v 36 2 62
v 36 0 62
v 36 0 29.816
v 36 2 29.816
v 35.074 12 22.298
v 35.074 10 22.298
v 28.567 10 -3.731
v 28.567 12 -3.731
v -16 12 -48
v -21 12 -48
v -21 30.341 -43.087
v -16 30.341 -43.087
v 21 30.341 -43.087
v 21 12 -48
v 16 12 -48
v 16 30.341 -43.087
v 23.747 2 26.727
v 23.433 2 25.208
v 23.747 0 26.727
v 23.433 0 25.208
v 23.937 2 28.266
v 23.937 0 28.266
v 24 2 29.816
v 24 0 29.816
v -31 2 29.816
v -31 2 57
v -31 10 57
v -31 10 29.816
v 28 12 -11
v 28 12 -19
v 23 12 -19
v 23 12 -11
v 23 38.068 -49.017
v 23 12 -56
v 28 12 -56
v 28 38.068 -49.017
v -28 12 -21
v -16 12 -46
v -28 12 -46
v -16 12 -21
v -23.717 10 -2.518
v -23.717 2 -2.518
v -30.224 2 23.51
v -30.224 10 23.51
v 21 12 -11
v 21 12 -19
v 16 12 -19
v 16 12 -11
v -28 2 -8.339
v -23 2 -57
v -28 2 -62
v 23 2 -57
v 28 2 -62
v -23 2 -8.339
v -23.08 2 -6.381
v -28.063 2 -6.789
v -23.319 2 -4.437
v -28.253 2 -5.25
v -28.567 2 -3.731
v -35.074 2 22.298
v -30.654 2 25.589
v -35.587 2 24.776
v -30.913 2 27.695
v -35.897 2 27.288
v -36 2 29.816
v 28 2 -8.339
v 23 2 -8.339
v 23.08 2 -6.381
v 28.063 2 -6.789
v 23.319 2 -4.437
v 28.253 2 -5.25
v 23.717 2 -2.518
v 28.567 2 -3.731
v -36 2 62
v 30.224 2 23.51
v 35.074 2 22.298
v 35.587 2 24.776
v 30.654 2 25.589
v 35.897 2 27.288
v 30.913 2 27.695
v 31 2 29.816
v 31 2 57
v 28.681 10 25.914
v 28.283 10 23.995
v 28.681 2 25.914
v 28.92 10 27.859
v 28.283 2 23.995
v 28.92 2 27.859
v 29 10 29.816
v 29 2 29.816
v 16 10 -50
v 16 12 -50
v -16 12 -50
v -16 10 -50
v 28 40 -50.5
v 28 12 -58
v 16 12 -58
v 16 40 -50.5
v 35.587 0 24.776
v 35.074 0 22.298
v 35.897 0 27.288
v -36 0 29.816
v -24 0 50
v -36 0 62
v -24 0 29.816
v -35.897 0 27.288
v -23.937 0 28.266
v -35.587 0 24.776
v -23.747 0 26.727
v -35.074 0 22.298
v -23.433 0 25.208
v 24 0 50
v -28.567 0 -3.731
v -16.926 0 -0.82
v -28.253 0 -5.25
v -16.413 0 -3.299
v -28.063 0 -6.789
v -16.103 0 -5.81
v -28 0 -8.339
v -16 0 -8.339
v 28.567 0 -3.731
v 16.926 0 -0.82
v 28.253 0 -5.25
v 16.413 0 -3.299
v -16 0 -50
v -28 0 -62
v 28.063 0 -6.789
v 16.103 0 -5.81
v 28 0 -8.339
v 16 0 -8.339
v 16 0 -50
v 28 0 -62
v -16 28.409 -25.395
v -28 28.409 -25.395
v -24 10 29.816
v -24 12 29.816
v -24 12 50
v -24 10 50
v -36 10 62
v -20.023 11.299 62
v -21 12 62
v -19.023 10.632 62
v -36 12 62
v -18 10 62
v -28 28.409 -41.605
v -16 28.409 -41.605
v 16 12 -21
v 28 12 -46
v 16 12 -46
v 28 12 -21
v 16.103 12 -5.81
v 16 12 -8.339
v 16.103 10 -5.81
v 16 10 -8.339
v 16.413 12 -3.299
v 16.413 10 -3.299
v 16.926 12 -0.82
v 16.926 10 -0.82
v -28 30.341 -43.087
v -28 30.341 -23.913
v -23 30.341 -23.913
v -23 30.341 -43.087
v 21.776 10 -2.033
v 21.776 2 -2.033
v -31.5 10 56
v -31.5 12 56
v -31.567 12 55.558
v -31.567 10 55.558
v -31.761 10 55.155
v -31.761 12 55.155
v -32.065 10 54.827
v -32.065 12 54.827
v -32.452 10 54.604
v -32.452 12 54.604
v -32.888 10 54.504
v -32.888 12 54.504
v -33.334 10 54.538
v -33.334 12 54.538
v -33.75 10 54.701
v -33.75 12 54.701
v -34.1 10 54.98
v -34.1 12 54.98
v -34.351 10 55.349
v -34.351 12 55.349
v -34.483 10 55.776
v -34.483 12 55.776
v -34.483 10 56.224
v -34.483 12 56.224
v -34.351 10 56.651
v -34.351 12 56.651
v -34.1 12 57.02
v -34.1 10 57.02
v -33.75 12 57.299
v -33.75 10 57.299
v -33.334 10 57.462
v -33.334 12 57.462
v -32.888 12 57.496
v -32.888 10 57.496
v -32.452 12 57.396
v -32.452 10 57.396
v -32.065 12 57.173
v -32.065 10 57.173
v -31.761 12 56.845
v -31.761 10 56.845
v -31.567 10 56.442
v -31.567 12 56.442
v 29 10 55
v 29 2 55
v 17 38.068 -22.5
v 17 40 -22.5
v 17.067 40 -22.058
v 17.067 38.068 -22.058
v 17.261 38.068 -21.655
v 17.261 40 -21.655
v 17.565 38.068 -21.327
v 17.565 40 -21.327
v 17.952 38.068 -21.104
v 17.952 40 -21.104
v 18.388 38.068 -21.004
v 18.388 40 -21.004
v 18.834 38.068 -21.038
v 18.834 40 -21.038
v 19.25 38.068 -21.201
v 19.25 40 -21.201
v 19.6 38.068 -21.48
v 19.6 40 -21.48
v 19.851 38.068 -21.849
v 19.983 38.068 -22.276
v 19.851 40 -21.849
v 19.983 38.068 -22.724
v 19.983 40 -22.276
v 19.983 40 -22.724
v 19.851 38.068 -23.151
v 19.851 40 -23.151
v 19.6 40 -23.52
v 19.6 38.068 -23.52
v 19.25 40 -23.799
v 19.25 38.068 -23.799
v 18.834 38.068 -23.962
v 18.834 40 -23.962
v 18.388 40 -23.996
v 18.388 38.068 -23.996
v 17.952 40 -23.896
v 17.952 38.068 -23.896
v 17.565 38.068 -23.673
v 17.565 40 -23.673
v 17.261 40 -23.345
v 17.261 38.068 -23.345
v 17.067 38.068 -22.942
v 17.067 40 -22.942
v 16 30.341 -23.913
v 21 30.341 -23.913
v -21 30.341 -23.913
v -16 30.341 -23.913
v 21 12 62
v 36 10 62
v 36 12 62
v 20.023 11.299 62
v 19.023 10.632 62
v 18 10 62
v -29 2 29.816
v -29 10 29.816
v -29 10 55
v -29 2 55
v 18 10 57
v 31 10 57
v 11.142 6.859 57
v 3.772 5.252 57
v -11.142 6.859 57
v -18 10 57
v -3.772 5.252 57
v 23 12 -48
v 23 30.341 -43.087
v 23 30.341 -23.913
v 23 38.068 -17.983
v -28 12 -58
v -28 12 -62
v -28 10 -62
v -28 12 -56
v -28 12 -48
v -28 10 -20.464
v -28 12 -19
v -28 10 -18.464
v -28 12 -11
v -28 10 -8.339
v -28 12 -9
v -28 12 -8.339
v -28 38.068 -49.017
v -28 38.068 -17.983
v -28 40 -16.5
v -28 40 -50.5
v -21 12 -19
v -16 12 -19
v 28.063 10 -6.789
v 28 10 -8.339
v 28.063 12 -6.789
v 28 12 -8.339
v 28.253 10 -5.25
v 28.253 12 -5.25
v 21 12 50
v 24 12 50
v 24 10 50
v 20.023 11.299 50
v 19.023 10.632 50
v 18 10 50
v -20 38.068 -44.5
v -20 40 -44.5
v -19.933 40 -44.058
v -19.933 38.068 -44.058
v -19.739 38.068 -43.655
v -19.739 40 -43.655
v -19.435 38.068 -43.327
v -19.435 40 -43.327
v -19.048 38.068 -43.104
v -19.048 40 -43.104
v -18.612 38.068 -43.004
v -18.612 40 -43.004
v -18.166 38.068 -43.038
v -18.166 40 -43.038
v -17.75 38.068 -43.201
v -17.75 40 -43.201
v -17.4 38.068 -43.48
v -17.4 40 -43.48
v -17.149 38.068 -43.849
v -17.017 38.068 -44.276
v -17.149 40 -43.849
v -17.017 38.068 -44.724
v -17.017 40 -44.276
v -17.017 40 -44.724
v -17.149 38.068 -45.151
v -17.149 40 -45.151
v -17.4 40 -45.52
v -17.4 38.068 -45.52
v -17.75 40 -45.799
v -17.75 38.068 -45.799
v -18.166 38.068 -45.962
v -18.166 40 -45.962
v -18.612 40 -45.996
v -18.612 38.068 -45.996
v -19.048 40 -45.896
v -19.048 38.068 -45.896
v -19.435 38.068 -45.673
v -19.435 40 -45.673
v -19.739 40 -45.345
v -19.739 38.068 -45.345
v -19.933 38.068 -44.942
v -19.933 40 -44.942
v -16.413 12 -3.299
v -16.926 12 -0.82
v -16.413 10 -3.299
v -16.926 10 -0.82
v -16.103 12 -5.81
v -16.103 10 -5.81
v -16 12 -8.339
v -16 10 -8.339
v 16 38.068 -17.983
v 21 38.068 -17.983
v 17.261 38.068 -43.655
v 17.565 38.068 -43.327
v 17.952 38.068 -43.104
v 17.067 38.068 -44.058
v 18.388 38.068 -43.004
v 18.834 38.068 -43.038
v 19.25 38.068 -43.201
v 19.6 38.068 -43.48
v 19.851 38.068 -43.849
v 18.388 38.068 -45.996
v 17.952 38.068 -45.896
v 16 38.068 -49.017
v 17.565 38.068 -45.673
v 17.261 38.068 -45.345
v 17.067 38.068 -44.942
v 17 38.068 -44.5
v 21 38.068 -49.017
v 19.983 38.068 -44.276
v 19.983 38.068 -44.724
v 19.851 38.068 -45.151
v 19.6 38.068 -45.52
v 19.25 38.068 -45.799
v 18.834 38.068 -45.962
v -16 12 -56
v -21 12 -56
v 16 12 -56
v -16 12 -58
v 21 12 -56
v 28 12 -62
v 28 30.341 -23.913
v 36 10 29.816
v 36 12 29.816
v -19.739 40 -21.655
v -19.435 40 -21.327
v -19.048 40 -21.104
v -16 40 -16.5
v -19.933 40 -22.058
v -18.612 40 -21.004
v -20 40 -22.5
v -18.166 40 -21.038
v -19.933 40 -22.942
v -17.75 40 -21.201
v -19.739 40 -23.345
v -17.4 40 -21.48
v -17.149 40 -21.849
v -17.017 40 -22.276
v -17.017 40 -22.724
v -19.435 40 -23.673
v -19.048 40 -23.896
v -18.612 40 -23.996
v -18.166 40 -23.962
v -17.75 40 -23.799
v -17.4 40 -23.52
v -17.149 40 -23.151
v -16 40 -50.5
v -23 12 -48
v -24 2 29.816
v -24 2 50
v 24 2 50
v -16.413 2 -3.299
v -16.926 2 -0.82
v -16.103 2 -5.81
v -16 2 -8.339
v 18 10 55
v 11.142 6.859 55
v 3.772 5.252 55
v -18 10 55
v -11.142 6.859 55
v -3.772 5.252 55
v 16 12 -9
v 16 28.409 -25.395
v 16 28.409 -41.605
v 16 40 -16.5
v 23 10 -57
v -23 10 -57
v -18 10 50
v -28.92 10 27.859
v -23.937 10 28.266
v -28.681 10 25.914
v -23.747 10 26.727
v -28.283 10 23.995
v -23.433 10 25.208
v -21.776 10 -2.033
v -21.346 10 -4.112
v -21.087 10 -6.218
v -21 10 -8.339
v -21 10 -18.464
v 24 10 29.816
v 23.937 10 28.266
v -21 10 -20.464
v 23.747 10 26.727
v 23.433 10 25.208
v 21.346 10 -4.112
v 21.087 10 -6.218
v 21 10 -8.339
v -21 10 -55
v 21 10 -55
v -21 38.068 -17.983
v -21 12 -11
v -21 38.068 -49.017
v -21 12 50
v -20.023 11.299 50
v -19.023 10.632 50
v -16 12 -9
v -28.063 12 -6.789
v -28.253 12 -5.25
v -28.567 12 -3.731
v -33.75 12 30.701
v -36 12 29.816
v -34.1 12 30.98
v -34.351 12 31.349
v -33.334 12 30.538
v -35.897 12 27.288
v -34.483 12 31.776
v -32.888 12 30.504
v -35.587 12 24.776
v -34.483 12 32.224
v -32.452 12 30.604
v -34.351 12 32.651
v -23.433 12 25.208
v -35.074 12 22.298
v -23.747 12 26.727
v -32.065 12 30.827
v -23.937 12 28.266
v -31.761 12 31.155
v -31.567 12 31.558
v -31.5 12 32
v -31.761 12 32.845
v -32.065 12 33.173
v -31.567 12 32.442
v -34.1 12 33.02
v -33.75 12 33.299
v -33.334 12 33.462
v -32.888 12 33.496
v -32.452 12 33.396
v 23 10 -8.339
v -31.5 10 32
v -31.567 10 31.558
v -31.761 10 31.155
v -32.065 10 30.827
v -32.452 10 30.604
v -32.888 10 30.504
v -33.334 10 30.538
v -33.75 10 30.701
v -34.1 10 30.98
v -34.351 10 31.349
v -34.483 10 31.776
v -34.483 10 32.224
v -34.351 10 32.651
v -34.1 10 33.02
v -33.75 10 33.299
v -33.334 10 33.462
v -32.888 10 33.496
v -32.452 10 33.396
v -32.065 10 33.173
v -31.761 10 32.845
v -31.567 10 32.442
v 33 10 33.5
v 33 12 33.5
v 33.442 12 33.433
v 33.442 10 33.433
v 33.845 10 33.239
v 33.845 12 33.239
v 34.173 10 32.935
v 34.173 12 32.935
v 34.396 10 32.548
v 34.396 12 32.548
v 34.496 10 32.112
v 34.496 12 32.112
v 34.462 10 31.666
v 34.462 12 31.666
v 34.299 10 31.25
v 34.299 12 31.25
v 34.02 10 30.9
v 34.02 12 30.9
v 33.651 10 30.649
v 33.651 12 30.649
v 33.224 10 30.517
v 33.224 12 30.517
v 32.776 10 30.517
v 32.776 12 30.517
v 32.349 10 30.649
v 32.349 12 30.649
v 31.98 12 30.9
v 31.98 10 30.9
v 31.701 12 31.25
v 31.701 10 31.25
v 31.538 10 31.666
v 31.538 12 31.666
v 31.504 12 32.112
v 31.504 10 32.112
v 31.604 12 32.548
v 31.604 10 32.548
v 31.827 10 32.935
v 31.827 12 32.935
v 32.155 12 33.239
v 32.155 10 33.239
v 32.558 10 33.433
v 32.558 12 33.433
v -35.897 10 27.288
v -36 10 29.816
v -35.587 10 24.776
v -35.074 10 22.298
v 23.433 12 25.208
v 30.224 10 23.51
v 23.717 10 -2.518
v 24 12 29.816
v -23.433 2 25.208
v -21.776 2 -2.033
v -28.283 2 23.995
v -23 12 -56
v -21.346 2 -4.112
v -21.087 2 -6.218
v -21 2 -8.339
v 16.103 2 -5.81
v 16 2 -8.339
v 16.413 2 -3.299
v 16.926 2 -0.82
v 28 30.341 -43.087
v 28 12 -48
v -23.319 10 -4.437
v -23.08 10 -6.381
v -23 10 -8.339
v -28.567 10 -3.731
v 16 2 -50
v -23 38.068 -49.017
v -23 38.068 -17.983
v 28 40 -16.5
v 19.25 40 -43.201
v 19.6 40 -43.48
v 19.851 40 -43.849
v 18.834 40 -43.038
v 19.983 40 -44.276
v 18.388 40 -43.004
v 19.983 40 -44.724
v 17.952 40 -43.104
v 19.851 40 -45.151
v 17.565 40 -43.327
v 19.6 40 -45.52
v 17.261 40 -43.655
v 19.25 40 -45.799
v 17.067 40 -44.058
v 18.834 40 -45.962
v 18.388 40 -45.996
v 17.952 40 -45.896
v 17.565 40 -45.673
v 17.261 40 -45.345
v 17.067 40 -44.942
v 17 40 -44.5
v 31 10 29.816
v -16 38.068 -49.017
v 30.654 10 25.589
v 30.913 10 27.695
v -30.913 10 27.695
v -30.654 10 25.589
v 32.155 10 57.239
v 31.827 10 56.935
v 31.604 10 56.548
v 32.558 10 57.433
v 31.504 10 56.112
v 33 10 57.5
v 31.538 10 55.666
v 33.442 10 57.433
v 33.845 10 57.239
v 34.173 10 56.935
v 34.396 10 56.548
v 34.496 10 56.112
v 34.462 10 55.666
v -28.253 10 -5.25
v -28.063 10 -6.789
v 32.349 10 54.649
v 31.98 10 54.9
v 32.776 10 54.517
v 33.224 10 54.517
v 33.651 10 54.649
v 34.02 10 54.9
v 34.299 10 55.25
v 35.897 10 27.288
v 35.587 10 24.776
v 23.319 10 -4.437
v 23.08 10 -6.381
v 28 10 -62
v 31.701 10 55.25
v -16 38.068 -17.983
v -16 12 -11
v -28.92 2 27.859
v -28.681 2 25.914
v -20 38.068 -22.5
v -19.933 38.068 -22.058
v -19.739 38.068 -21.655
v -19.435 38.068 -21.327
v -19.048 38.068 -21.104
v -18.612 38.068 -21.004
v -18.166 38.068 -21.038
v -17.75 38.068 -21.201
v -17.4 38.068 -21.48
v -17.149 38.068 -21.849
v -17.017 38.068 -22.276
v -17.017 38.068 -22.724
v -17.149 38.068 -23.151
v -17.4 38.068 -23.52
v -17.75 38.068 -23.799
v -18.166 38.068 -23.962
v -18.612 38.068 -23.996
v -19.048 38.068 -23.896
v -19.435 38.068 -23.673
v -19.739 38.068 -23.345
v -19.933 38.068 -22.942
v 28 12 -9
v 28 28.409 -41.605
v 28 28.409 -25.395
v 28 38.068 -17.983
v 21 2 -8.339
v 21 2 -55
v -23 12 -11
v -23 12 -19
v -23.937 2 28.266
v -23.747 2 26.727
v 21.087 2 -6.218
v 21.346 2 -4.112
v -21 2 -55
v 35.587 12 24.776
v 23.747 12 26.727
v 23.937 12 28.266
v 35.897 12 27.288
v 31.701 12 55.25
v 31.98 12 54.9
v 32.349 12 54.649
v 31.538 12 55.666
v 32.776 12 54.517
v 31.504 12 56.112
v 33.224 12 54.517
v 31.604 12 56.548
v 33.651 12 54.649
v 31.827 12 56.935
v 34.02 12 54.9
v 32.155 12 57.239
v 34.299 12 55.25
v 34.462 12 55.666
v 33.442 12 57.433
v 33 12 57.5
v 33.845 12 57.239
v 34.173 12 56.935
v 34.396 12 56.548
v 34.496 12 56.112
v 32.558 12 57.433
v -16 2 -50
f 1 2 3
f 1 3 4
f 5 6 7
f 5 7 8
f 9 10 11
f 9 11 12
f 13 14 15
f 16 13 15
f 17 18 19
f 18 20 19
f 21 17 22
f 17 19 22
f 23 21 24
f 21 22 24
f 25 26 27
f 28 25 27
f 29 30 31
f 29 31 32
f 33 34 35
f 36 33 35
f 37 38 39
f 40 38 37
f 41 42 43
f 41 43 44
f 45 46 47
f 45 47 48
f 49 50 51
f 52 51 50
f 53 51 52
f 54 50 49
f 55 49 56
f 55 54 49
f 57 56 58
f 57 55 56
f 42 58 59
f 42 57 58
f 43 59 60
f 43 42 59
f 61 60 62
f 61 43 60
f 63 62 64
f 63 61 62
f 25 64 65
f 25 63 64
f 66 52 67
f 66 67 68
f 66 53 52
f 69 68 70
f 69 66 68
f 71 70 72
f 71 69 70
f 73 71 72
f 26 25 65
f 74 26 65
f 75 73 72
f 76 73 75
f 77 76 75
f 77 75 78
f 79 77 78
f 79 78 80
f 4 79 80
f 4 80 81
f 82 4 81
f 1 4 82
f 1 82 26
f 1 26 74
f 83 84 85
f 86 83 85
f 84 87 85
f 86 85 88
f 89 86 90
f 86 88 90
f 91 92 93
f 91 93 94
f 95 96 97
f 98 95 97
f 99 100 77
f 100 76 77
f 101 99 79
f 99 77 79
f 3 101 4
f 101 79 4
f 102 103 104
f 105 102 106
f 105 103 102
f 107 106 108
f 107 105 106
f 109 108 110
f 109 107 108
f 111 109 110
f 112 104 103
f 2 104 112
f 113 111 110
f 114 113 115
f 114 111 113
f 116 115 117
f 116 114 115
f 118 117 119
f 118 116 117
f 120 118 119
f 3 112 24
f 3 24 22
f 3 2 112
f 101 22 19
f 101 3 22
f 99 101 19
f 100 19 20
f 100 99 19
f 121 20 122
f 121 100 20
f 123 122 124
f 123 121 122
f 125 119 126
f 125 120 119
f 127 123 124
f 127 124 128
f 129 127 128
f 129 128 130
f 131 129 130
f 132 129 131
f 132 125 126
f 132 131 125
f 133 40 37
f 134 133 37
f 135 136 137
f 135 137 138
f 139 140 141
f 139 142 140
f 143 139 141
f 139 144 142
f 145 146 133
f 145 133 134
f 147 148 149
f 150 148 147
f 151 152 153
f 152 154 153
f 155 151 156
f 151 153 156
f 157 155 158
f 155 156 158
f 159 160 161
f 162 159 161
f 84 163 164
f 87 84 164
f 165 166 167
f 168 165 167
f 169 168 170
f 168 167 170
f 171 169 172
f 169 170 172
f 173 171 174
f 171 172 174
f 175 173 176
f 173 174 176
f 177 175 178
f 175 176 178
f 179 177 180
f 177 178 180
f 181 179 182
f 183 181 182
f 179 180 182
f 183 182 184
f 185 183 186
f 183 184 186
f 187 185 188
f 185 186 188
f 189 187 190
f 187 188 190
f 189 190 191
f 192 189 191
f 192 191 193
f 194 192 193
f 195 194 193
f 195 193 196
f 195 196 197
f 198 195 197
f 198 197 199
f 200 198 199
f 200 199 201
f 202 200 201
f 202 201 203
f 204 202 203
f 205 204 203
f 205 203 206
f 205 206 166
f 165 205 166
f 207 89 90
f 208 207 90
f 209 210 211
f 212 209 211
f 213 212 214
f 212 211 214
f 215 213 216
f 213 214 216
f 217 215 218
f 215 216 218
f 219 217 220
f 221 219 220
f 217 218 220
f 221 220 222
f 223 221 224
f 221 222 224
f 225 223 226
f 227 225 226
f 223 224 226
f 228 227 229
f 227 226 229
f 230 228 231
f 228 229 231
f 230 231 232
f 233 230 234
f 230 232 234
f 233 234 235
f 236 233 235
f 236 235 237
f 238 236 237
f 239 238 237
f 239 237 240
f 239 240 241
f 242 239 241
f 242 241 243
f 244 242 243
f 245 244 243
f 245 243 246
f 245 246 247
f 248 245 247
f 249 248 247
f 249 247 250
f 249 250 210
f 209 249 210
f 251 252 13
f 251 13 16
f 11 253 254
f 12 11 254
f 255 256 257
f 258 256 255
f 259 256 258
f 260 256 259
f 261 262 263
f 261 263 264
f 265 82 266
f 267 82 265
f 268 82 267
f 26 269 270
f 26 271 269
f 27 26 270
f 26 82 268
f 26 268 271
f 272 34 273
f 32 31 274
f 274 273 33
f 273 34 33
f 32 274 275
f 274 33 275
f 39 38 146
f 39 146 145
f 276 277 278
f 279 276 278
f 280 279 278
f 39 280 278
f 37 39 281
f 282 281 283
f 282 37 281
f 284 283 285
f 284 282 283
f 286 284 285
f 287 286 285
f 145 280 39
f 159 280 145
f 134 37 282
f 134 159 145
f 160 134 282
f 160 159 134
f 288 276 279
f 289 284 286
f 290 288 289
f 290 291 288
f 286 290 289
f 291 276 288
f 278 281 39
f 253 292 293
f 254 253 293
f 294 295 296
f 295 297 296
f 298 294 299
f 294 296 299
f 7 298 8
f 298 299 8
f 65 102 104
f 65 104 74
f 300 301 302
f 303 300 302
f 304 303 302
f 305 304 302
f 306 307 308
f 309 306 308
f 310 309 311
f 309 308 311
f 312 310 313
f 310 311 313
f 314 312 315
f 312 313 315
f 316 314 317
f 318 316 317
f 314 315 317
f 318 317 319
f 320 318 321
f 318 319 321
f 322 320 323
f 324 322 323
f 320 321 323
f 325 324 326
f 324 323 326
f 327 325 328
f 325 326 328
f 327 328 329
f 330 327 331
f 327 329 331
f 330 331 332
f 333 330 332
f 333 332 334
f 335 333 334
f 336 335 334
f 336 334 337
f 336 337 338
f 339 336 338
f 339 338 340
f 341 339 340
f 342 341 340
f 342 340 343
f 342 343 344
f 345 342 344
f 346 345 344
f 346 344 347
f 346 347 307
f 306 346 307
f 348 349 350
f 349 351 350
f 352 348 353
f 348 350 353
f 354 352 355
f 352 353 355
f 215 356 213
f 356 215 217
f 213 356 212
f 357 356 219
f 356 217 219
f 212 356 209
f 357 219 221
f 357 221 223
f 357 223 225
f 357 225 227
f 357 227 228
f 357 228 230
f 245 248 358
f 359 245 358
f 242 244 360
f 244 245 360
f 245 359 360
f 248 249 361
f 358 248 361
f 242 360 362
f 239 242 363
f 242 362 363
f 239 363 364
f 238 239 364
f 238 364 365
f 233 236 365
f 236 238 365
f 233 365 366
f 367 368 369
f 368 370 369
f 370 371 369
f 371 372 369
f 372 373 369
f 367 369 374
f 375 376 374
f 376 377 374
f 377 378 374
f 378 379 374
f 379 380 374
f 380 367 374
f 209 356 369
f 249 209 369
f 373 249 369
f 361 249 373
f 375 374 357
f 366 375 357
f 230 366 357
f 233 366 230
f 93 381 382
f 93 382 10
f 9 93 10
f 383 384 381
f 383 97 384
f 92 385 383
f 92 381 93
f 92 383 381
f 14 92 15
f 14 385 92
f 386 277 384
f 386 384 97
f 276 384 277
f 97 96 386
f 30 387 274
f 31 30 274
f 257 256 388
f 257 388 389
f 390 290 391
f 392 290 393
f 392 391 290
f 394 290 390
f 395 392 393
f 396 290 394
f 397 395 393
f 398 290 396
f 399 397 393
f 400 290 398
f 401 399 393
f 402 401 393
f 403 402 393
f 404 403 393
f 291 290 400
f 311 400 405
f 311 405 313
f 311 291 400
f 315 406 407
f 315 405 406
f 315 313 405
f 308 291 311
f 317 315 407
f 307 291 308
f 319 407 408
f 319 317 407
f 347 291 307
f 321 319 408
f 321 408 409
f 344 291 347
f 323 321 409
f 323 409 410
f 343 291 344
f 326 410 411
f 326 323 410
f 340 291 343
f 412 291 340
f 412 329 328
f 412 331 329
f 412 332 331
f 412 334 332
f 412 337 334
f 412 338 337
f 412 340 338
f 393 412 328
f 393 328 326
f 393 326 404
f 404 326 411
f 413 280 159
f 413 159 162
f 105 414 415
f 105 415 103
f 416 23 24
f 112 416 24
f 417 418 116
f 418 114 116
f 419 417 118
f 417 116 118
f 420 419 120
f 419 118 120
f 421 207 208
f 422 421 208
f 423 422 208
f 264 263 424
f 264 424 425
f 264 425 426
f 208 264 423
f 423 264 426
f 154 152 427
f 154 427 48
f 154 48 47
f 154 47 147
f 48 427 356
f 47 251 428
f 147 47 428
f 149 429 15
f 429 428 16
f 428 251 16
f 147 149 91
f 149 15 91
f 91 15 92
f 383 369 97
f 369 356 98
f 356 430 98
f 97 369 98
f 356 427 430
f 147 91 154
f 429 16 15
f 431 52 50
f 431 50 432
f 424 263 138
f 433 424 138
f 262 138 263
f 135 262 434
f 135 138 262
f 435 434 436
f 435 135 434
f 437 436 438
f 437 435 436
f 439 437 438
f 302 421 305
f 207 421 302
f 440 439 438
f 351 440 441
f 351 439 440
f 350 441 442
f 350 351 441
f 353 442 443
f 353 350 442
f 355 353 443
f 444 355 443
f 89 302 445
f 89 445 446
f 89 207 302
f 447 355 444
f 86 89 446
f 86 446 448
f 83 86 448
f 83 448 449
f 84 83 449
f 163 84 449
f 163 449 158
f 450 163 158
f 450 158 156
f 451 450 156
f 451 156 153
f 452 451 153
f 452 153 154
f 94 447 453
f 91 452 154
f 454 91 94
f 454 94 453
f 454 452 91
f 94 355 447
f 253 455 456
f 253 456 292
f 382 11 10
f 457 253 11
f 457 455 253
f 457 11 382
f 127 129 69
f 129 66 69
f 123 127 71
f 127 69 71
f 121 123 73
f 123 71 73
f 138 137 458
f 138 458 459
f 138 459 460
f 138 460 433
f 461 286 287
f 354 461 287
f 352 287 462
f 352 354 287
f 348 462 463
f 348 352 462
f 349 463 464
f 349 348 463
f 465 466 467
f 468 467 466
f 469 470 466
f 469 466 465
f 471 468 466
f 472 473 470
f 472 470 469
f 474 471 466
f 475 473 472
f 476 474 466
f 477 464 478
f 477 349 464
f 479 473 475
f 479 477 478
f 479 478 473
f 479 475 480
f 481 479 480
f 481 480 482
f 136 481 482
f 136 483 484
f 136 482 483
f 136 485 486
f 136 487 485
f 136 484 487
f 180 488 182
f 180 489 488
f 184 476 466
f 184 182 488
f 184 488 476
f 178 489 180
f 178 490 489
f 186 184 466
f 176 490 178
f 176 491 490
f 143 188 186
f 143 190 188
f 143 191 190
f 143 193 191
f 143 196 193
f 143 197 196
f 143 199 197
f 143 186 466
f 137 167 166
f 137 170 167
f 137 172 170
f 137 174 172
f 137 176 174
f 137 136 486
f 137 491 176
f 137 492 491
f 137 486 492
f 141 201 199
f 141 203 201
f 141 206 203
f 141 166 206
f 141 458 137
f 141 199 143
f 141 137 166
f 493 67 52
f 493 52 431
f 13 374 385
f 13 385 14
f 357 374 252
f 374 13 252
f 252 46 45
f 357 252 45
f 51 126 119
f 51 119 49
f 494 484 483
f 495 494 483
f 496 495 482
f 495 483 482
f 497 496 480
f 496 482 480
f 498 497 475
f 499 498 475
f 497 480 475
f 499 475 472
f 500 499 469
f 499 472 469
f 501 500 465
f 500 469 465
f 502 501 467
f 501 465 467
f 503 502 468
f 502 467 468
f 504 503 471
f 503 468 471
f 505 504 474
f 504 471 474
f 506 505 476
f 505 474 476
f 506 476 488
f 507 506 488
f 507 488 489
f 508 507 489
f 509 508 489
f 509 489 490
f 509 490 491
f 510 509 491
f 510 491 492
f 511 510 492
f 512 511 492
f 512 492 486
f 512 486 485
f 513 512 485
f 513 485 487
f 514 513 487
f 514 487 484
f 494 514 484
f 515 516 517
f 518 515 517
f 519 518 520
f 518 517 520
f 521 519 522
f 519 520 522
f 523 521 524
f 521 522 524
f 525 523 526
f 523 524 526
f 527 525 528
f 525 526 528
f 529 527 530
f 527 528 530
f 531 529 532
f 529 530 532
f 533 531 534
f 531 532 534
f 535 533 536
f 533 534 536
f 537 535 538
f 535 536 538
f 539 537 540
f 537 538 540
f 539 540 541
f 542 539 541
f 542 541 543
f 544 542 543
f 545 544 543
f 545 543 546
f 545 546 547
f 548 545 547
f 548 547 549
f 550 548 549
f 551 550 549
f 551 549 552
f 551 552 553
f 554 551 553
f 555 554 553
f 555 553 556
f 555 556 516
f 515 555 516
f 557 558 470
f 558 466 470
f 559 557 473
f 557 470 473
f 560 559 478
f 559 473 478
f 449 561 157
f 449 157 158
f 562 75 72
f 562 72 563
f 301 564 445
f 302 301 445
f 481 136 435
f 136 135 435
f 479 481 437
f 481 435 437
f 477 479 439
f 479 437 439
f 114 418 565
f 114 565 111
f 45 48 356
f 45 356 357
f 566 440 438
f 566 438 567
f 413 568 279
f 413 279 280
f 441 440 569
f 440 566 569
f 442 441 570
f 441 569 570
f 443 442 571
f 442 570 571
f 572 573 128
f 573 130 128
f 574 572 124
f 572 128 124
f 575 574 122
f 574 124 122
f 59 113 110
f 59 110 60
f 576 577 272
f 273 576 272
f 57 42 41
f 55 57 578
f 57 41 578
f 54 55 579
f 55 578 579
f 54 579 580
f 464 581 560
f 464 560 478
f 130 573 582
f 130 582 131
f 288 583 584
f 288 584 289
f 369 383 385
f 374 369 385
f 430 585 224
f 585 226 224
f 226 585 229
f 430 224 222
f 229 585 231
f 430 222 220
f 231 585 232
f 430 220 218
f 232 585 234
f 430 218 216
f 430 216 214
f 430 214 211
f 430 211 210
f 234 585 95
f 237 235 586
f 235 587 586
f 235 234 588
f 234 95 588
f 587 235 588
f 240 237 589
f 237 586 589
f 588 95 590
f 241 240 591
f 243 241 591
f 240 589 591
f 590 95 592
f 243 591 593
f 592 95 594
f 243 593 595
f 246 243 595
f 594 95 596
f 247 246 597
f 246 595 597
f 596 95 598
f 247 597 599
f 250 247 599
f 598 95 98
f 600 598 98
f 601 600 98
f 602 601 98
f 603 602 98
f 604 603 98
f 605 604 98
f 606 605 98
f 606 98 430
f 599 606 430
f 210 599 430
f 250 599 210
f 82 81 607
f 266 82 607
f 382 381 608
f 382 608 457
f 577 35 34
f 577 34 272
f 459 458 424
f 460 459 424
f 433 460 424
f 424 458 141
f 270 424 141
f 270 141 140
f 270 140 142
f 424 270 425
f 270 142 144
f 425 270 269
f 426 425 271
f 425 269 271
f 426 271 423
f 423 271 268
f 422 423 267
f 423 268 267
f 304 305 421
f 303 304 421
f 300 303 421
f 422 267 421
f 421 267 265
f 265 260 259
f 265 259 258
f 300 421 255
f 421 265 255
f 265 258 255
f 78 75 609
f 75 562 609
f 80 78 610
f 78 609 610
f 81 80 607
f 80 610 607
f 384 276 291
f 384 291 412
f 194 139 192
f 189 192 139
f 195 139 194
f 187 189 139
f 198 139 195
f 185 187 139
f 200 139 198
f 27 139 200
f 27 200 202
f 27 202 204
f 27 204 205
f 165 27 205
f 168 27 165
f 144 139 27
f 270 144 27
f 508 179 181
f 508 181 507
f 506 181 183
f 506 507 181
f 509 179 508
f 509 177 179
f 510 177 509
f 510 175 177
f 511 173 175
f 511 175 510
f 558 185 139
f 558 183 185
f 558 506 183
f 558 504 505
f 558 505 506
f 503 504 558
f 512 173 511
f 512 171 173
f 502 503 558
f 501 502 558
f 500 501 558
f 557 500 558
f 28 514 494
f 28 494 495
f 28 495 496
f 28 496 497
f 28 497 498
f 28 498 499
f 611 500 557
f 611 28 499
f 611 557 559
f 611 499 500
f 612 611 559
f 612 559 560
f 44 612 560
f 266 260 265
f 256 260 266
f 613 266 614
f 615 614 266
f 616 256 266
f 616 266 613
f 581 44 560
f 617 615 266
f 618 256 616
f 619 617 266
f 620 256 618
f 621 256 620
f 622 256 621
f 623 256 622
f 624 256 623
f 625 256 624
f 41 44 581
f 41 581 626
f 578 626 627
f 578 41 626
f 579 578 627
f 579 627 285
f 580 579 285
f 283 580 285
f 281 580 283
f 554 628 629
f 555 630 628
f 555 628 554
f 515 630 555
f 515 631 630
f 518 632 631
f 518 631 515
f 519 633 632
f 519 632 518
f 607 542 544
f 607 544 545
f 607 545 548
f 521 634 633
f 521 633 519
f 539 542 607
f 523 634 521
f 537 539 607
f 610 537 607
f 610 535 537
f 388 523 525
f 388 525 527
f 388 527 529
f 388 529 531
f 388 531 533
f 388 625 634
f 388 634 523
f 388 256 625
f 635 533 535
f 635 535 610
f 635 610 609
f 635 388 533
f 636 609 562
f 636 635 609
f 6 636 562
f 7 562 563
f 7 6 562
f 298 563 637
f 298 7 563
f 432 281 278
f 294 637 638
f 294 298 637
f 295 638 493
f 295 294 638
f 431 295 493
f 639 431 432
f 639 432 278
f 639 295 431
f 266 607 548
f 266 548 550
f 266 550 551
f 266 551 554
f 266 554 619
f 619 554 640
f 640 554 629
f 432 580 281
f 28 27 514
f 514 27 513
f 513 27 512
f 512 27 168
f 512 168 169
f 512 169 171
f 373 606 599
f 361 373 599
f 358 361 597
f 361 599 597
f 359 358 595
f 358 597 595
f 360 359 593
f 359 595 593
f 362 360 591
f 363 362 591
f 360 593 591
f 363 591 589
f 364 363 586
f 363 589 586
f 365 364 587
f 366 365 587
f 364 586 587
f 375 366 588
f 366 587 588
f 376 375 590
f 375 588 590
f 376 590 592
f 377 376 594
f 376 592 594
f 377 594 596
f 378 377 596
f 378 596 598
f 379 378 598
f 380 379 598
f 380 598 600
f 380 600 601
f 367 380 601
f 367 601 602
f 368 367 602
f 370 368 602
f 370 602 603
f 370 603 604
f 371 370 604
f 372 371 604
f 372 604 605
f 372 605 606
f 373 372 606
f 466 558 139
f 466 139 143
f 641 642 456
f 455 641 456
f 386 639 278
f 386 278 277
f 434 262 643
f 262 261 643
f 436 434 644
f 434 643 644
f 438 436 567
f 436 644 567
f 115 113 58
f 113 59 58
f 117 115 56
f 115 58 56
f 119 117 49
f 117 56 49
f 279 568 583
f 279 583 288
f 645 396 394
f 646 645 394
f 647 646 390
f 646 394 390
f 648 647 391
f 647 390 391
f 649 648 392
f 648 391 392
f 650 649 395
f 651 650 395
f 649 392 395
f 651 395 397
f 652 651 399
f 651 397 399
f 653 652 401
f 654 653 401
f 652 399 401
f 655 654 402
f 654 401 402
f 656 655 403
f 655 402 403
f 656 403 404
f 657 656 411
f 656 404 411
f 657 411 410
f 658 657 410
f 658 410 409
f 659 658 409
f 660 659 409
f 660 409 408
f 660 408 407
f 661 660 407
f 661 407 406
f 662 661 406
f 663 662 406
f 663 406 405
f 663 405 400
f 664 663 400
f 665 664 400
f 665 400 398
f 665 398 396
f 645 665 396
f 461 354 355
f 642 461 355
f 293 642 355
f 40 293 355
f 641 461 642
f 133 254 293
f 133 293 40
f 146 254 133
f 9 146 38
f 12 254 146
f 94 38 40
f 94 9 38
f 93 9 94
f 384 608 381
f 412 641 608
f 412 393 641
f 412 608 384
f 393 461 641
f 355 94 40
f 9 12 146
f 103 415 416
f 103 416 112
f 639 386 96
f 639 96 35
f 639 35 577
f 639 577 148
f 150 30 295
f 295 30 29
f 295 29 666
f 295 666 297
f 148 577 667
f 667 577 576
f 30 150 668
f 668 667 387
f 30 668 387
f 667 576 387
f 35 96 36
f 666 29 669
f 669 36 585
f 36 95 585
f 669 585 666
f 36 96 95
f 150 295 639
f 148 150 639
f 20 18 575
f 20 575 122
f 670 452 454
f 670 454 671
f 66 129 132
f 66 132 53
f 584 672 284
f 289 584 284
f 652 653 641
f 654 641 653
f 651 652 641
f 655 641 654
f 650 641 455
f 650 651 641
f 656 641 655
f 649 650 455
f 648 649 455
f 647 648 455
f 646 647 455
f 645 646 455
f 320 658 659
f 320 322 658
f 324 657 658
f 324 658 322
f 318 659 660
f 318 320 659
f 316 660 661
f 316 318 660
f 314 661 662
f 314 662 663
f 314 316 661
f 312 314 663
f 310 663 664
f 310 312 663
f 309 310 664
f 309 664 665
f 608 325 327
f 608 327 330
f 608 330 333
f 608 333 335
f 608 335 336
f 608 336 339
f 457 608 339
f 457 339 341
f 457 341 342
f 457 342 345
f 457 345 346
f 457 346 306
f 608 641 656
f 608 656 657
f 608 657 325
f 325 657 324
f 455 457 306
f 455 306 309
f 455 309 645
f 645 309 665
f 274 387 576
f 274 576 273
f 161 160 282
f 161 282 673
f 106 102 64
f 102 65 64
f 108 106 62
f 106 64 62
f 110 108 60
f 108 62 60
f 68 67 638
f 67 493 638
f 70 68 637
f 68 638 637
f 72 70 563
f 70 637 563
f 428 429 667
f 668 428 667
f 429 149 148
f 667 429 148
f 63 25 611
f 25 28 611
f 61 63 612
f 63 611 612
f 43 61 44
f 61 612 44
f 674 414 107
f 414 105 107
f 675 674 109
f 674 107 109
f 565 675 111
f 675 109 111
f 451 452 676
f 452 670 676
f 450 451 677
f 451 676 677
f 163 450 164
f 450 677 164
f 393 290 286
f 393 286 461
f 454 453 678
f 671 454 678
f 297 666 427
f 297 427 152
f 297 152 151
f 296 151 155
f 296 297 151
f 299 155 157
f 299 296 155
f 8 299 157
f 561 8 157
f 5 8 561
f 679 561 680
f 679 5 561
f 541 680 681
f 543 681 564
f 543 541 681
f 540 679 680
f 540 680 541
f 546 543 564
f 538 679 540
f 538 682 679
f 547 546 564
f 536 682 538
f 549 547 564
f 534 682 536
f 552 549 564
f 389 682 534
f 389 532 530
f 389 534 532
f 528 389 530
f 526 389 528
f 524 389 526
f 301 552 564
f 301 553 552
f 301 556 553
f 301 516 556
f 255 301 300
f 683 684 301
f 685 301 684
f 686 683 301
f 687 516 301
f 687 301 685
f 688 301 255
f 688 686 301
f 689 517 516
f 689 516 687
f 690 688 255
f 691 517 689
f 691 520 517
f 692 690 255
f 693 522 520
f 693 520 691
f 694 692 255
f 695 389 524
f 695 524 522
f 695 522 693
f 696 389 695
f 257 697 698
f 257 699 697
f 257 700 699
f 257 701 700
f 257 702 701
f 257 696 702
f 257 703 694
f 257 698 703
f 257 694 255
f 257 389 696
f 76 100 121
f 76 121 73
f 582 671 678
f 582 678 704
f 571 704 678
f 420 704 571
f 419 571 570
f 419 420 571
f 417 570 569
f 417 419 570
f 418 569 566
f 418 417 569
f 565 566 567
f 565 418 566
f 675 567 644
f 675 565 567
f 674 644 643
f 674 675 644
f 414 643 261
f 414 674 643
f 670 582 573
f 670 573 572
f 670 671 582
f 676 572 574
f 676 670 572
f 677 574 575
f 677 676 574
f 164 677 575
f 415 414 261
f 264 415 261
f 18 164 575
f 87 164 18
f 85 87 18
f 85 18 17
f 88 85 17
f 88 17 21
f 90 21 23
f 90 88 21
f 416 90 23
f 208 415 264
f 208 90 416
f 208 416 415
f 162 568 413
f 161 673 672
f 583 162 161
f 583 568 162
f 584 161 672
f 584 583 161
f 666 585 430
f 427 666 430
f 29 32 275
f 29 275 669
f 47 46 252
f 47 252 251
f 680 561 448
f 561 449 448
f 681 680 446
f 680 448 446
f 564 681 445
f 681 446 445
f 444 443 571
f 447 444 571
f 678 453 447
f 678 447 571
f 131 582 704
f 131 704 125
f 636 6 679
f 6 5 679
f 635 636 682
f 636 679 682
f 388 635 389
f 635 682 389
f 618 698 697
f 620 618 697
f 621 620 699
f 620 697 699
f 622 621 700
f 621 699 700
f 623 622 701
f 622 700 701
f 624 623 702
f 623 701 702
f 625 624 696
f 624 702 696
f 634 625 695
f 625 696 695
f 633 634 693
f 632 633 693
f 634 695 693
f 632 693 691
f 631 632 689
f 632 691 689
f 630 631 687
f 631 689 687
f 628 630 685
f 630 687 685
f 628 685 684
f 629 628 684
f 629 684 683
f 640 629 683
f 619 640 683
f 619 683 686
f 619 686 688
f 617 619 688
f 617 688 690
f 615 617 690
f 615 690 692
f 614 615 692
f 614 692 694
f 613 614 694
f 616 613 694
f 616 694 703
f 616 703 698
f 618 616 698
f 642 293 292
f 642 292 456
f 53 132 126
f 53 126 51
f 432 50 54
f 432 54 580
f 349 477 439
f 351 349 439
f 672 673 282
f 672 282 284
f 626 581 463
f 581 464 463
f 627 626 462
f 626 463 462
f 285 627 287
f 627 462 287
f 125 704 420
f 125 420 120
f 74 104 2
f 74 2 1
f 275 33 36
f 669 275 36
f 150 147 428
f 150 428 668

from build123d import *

# Parameters (mm, degrees)
CUT_EXTRUDE1_START   = -1
CUT_EXTRUDE1_DEPTH   = 5
MIRROR2_START        = -1
MIRROR2_COPY_1_DEPTH = 5
CUT_EXTRUDE2_REACH   = 84.098
SKETCH6_R            = 1.5
CUT_EXTRUDE3_REACH   = 78.968
SKETCH7_R            = 1.5
SKETCH8_R            = 35.200319601
CUT_EXTRUDE4_DEPTH   = 12


with BuildPart() as part:
    # Sweep1: sweep along a path in Sketch1
    with BuildLine(Plane(origin=(0, 0, 0), x_dir=(1, 0, 0), z_dir=(0, 1, 0))) as sweep1_path:
        Line((-28, 62), (28, 62))
        Line((28, 62), (28, 8.339006887))
        ThreePointArc((28, 8.339006887), (28.142356423, 6.017524877), (28.567292497, 3.730830011))
        Line((28.567292497, 3.730830011), (35.074417505, -22.297670018))
        ThreePointArc((35.074417505, -22.297670018), (35.767734257, -26.02859322), (36, -29.816274394))
        Line((36, -29.816274394), (36, -62))
        Line((36, -62), (-36, -62))
        Line((-36, -62), (-36, -29.816274394))
        ThreePointArc((-36, -29.816274394), (-35.767734257, -26.02859322), (-35.074417505, -22.297670018))
        Line((-35.074417505, -22.297670018), (-28.567292497, 3.730830011))
        ThreePointArc((-28.567292497, 3.730830011), (-28.142356423, 6.017524877), (-28, 8.339006887))
        Line((-28, 8.339006887), (-28, 62))
    # Sketch2 → Sweep1 (sweep)
    with BuildSketch(Plane.XY.offset(-62)):
        Polygon((28, 0), (16, 0), (16, 2), (21, 2), (21, 10), (16, 10), (16, 12), (28, 12), (28, 10), (23, 10), (23, 2), (28, 2), align=None)
    sweep(path=sweep1_path.line, transition=Transition.RIGHT)

    # Sweep2: sweep along a path in Sketch3
    with BuildLine(Plane(origin=(28, 0, 0), x_dir=(0, 0, -1), z_dir=(1, 0, 0))) as sweep2_path:
        Line((9, 12), (16.5, 40))
        Line((16.5, 40), (50.5, 40))
        Line((50.5, 40), (58, 12))
    # Sketch4 → Sweep2 (sweep)
    with BuildSketch(Plane(origin=(0, 12, 0), x_dir=(1, 0, 0), z_dir=(0, 1, 0))):
        Polygon((28, 58), (16, 58), (16, 56), (21, 56), (21, 48), (16, 48), (16, 46), (28, 46), (28, 48), (23, 48), (23, 56), (28, 56), align=None)
    sweep2 = sweep(path=sweep2_path.line, transition=Transition.RIGHT)

    # Sketch5 → Cut-Extrude1 (cut)
    with BuildSketch(Plane(origin=(22, 0, 0), x_dir=(0, 0, -1), z_dir=(1, 0, 0)).offset(CUT_EXTRUDE1_START)):
        Polygon((17.661112764, 7.001487652), (18.464285714, 10), (20.464285714, 10), (19.393335317, 6.001785183), align=None)
    cut_extrude1 = extrude(amount=-CUT_EXTRUDE1_DEPTH, mode=Mode.SUBTRACT)

    # Mirror1: Cut-Extrude1 across plane
    add(cut_extrude1.mirror(Plane(origin=(22, 0, 0), x_dir=(0, 0, 1), z_dir=(1, 0, 0))), mode=Mode.SUBTRACT)

    # Mirror2: Sweep2, Cut-Extrude1 across plane
    add(sweep2.mirror(Plane(origin=(0, 0, 0), x_dir=(0, 0, 1), z_dir=(1, 0, 0))))
    add(cut_extrude1.mirror(Plane(origin=(0, 0, 0), x_dir=(0, 0, 1), z_dir=(1, 0, 0))), mode=Mode.SUBTRACT)

    # Mirror2 copy 1 sketch → Mirror2 copy 1 (cut)
    with BuildSketch(Plane(origin=(-22, 0, 0), x_dir=(0, 0, -1), z_dir=(1, 0, 0)).offset(MIRROR2_START)):
        Polygon((17.661112764, 7.001487652), (18.464285714, 10), (20.464285714, 10), (19.393335317, 6.001785183), align=None)
    extrude(amount=-MIRROR2_COPY_1_DEPTH, mode=Mode.SUBTRACT)

    # Sketch6 → Cut-Extrude2 (cut, up to next)
    with BuildSketch(Plane(origin=(0, 40, 0), x_dir=(1, 0, 0), z_dir=(0, 1, 0)), mode=Mode.PRIVATE) as cut_extrude2_sk1:
        with Locations(Location((18.5, 44.5, 0), (0, 0, 180))):
            Circle(SKETCH6_R)
    cut_extrude2_tool1 = extrude(cut_extrude2_sk1.sketch, amount=-CUT_EXTRUDE2_REACH, mode=Mode.PRIVATE) & part.part
    # Sketch6 → Cut-Extrude2 (cut, up to next)
    with BuildSketch(Plane(origin=(0, 40, 0), x_dir=(1, 0, 0), z_dir=(0, 1, 0)), mode=Mode.PRIVATE) as cut_extrude2_sk2:
        with Locations(Location((18.5, 22.5, 0), (0, 0, 180))):
            Circle(SKETCH6_R)
    cut_extrude2_tool2 = extrude(cut_extrude2_sk2.sketch, amount=-CUT_EXTRUDE2_REACH, mode=Mode.PRIVATE) & part.part
    # Sketch6 → Cut-Extrude2 (cut, up to next)
    with BuildSketch(Plane(origin=(0, 40, 0), x_dir=(1, 0, 0), z_dir=(0, 1, 0)), mode=Mode.PRIVATE) as cut_extrude2_sk3:
        with Locations(Location((-18.5, 44.5, 0), (0, 0, 180))):
            Circle(SKETCH6_R)
    cut_extrude2_tool3 = extrude(cut_extrude2_sk3.sketch, amount=-CUT_EXTRUDE2_REACH, mode=Mode.PRIVATE) & part.part
    # Sketch6 → Cut-Extrude2 (cut, up to next)
    with BuildSketch(Plane(origin=(0, 40, 0), x_dir=(1, 0, 0), z_dir=(0, 1, 0)), mode=Mode.PRIVATE) as cut_extrude2_sk4:
        with Locations(Location((-18.5, 22.5, 0), (0, 0, 180))):
            Circle(SKETCH6_R)
    cut_extrude2_tool4 = extrude(cut_extrude2_sk4.sketch, amount=-CUT_EXTRUDE2_REACH, mode=Mode.PRIVATE) & part.part
    add(cut_extrude2_tool1.solids().sort_by_distance((18.5, 40, -44.5))[0], mode=Mode.SUBTRACT)
    add(cut_extrude2_tool2.solids().sort_by_distance((18.5, 40, -22.5))[0], mode=Mode.SUBTRACT)
    add(cut_extrude2_tool3.solids().sort_by_distance((-18.5, 40, -44.5))[0], mode=Mode.SUBTRACT)
    add(cut_extrude2_tool4.solids().sort_by_distance((-18.5, 40, -22.5))[0], mode=Mode.SUBTRACT)

    # Sketch7 → Cut-Extrude3 (cut, up to next)
    with BuildSketch(Plane(origin=(0, 12, 0), x_dir=(1, 0, 0), z_dir=(0, 1, 0)), mode=Mode.PRIVATE) as cut_extrude3_sk1:
        with Locations(Location((33, -32, 0), (0, 0, 270))):
            Circle(SKETCH7_R)
    cut_extrude3_tool1 = extrude(cut_extrude3_sk1.sketch, amount=-CUT_EXTRUDE3_REACH, mode=Mode.PRIVATE) & part.part
    # Sketch7 → Cut-Extrude3 (cut, up to next)
    with BuildSketch(Plane(origin=(0, 12, 0), x_dir=(1, 0, 0), z_dir=(0, 1, 0)), mode=Mode.PRIVATE) as cut_extrude3_sk2:
        with Locations(Location((33, -56, 0), (0, 0, 270))):
            Circle(SKETCH7_R)
    cut_extrude3_tool2 = extrude(cut_extrude3_sk2.sketch, amount=-CUT_EXTRUDE3_REACH, mode=Mode.PRIVATE) & part.part
    # Sketch7 → Cut-Extrude3 (cut, up to next)
    with BuildSketch(Plane(origin=(0, 12, 0), x_dir=(1, 0, 0), z_dir=(0, 1, 0)), mode=Mode.PRIVATE) as cut_extrude3_sk3:
        with Locations((-33, -56)):
            Circle(SKETCH7_R)
    cut_extrude3_tool3 = extrude(cut_extrude3_sk3.sketch, amount=-CUT_EXTRUDE3_REACH, mode=Mode.PRIVATE) & part.part
    # Sketch7 → Cut-Extrude3 (cut, up to next)
    with BuildSketch(Plane(origin=(0, 12, 0), x_dir=(1, 0, 0), z_dir=(0, 1, 0)), mode=Mode.PRIVATE) as cut_extrude3_sk4:
        with Locations((-33, -32)):
            Circle(SKETCH7_R)
    cut_extrude3_tool4 = extrude(cut_extrude3_sk4.sketch, amount=-CUT_EXTRUDE3_REACH, mode=Mode.PRIVATE) & part.part
    add(cut_extrude3_tool1.solids().sort_by_distance((33, 12, 32))[0], mode=Mode.SUBTRACT)
    add(cut_extrude3_tool2.solids().sort_by_distance((33, 12, 56))[0], mode=Mode.SUBTRACT)
    add(cut_extrude3_tool3.solids().sort_by_distance((-33, 12, 56))[0], mode=Mode.SUBTRACT)
    add(cut_extrude3_tool4.solids().sort_by_distance((-33, 12, 32))[0], mode=Mode.SUBTRACT)

    # Sketch8 → Cut-Extrude4 (cut)
    with BuildSketch(Plane.XY.offset(62)):
        with Locations((0, 40.25)):
            Circle(SKETCH8_R)
    extrude(amount=-CUT_EXTRUDE4_DEPTH, mode=Mode.SUBTRACT)


solid = part.part
